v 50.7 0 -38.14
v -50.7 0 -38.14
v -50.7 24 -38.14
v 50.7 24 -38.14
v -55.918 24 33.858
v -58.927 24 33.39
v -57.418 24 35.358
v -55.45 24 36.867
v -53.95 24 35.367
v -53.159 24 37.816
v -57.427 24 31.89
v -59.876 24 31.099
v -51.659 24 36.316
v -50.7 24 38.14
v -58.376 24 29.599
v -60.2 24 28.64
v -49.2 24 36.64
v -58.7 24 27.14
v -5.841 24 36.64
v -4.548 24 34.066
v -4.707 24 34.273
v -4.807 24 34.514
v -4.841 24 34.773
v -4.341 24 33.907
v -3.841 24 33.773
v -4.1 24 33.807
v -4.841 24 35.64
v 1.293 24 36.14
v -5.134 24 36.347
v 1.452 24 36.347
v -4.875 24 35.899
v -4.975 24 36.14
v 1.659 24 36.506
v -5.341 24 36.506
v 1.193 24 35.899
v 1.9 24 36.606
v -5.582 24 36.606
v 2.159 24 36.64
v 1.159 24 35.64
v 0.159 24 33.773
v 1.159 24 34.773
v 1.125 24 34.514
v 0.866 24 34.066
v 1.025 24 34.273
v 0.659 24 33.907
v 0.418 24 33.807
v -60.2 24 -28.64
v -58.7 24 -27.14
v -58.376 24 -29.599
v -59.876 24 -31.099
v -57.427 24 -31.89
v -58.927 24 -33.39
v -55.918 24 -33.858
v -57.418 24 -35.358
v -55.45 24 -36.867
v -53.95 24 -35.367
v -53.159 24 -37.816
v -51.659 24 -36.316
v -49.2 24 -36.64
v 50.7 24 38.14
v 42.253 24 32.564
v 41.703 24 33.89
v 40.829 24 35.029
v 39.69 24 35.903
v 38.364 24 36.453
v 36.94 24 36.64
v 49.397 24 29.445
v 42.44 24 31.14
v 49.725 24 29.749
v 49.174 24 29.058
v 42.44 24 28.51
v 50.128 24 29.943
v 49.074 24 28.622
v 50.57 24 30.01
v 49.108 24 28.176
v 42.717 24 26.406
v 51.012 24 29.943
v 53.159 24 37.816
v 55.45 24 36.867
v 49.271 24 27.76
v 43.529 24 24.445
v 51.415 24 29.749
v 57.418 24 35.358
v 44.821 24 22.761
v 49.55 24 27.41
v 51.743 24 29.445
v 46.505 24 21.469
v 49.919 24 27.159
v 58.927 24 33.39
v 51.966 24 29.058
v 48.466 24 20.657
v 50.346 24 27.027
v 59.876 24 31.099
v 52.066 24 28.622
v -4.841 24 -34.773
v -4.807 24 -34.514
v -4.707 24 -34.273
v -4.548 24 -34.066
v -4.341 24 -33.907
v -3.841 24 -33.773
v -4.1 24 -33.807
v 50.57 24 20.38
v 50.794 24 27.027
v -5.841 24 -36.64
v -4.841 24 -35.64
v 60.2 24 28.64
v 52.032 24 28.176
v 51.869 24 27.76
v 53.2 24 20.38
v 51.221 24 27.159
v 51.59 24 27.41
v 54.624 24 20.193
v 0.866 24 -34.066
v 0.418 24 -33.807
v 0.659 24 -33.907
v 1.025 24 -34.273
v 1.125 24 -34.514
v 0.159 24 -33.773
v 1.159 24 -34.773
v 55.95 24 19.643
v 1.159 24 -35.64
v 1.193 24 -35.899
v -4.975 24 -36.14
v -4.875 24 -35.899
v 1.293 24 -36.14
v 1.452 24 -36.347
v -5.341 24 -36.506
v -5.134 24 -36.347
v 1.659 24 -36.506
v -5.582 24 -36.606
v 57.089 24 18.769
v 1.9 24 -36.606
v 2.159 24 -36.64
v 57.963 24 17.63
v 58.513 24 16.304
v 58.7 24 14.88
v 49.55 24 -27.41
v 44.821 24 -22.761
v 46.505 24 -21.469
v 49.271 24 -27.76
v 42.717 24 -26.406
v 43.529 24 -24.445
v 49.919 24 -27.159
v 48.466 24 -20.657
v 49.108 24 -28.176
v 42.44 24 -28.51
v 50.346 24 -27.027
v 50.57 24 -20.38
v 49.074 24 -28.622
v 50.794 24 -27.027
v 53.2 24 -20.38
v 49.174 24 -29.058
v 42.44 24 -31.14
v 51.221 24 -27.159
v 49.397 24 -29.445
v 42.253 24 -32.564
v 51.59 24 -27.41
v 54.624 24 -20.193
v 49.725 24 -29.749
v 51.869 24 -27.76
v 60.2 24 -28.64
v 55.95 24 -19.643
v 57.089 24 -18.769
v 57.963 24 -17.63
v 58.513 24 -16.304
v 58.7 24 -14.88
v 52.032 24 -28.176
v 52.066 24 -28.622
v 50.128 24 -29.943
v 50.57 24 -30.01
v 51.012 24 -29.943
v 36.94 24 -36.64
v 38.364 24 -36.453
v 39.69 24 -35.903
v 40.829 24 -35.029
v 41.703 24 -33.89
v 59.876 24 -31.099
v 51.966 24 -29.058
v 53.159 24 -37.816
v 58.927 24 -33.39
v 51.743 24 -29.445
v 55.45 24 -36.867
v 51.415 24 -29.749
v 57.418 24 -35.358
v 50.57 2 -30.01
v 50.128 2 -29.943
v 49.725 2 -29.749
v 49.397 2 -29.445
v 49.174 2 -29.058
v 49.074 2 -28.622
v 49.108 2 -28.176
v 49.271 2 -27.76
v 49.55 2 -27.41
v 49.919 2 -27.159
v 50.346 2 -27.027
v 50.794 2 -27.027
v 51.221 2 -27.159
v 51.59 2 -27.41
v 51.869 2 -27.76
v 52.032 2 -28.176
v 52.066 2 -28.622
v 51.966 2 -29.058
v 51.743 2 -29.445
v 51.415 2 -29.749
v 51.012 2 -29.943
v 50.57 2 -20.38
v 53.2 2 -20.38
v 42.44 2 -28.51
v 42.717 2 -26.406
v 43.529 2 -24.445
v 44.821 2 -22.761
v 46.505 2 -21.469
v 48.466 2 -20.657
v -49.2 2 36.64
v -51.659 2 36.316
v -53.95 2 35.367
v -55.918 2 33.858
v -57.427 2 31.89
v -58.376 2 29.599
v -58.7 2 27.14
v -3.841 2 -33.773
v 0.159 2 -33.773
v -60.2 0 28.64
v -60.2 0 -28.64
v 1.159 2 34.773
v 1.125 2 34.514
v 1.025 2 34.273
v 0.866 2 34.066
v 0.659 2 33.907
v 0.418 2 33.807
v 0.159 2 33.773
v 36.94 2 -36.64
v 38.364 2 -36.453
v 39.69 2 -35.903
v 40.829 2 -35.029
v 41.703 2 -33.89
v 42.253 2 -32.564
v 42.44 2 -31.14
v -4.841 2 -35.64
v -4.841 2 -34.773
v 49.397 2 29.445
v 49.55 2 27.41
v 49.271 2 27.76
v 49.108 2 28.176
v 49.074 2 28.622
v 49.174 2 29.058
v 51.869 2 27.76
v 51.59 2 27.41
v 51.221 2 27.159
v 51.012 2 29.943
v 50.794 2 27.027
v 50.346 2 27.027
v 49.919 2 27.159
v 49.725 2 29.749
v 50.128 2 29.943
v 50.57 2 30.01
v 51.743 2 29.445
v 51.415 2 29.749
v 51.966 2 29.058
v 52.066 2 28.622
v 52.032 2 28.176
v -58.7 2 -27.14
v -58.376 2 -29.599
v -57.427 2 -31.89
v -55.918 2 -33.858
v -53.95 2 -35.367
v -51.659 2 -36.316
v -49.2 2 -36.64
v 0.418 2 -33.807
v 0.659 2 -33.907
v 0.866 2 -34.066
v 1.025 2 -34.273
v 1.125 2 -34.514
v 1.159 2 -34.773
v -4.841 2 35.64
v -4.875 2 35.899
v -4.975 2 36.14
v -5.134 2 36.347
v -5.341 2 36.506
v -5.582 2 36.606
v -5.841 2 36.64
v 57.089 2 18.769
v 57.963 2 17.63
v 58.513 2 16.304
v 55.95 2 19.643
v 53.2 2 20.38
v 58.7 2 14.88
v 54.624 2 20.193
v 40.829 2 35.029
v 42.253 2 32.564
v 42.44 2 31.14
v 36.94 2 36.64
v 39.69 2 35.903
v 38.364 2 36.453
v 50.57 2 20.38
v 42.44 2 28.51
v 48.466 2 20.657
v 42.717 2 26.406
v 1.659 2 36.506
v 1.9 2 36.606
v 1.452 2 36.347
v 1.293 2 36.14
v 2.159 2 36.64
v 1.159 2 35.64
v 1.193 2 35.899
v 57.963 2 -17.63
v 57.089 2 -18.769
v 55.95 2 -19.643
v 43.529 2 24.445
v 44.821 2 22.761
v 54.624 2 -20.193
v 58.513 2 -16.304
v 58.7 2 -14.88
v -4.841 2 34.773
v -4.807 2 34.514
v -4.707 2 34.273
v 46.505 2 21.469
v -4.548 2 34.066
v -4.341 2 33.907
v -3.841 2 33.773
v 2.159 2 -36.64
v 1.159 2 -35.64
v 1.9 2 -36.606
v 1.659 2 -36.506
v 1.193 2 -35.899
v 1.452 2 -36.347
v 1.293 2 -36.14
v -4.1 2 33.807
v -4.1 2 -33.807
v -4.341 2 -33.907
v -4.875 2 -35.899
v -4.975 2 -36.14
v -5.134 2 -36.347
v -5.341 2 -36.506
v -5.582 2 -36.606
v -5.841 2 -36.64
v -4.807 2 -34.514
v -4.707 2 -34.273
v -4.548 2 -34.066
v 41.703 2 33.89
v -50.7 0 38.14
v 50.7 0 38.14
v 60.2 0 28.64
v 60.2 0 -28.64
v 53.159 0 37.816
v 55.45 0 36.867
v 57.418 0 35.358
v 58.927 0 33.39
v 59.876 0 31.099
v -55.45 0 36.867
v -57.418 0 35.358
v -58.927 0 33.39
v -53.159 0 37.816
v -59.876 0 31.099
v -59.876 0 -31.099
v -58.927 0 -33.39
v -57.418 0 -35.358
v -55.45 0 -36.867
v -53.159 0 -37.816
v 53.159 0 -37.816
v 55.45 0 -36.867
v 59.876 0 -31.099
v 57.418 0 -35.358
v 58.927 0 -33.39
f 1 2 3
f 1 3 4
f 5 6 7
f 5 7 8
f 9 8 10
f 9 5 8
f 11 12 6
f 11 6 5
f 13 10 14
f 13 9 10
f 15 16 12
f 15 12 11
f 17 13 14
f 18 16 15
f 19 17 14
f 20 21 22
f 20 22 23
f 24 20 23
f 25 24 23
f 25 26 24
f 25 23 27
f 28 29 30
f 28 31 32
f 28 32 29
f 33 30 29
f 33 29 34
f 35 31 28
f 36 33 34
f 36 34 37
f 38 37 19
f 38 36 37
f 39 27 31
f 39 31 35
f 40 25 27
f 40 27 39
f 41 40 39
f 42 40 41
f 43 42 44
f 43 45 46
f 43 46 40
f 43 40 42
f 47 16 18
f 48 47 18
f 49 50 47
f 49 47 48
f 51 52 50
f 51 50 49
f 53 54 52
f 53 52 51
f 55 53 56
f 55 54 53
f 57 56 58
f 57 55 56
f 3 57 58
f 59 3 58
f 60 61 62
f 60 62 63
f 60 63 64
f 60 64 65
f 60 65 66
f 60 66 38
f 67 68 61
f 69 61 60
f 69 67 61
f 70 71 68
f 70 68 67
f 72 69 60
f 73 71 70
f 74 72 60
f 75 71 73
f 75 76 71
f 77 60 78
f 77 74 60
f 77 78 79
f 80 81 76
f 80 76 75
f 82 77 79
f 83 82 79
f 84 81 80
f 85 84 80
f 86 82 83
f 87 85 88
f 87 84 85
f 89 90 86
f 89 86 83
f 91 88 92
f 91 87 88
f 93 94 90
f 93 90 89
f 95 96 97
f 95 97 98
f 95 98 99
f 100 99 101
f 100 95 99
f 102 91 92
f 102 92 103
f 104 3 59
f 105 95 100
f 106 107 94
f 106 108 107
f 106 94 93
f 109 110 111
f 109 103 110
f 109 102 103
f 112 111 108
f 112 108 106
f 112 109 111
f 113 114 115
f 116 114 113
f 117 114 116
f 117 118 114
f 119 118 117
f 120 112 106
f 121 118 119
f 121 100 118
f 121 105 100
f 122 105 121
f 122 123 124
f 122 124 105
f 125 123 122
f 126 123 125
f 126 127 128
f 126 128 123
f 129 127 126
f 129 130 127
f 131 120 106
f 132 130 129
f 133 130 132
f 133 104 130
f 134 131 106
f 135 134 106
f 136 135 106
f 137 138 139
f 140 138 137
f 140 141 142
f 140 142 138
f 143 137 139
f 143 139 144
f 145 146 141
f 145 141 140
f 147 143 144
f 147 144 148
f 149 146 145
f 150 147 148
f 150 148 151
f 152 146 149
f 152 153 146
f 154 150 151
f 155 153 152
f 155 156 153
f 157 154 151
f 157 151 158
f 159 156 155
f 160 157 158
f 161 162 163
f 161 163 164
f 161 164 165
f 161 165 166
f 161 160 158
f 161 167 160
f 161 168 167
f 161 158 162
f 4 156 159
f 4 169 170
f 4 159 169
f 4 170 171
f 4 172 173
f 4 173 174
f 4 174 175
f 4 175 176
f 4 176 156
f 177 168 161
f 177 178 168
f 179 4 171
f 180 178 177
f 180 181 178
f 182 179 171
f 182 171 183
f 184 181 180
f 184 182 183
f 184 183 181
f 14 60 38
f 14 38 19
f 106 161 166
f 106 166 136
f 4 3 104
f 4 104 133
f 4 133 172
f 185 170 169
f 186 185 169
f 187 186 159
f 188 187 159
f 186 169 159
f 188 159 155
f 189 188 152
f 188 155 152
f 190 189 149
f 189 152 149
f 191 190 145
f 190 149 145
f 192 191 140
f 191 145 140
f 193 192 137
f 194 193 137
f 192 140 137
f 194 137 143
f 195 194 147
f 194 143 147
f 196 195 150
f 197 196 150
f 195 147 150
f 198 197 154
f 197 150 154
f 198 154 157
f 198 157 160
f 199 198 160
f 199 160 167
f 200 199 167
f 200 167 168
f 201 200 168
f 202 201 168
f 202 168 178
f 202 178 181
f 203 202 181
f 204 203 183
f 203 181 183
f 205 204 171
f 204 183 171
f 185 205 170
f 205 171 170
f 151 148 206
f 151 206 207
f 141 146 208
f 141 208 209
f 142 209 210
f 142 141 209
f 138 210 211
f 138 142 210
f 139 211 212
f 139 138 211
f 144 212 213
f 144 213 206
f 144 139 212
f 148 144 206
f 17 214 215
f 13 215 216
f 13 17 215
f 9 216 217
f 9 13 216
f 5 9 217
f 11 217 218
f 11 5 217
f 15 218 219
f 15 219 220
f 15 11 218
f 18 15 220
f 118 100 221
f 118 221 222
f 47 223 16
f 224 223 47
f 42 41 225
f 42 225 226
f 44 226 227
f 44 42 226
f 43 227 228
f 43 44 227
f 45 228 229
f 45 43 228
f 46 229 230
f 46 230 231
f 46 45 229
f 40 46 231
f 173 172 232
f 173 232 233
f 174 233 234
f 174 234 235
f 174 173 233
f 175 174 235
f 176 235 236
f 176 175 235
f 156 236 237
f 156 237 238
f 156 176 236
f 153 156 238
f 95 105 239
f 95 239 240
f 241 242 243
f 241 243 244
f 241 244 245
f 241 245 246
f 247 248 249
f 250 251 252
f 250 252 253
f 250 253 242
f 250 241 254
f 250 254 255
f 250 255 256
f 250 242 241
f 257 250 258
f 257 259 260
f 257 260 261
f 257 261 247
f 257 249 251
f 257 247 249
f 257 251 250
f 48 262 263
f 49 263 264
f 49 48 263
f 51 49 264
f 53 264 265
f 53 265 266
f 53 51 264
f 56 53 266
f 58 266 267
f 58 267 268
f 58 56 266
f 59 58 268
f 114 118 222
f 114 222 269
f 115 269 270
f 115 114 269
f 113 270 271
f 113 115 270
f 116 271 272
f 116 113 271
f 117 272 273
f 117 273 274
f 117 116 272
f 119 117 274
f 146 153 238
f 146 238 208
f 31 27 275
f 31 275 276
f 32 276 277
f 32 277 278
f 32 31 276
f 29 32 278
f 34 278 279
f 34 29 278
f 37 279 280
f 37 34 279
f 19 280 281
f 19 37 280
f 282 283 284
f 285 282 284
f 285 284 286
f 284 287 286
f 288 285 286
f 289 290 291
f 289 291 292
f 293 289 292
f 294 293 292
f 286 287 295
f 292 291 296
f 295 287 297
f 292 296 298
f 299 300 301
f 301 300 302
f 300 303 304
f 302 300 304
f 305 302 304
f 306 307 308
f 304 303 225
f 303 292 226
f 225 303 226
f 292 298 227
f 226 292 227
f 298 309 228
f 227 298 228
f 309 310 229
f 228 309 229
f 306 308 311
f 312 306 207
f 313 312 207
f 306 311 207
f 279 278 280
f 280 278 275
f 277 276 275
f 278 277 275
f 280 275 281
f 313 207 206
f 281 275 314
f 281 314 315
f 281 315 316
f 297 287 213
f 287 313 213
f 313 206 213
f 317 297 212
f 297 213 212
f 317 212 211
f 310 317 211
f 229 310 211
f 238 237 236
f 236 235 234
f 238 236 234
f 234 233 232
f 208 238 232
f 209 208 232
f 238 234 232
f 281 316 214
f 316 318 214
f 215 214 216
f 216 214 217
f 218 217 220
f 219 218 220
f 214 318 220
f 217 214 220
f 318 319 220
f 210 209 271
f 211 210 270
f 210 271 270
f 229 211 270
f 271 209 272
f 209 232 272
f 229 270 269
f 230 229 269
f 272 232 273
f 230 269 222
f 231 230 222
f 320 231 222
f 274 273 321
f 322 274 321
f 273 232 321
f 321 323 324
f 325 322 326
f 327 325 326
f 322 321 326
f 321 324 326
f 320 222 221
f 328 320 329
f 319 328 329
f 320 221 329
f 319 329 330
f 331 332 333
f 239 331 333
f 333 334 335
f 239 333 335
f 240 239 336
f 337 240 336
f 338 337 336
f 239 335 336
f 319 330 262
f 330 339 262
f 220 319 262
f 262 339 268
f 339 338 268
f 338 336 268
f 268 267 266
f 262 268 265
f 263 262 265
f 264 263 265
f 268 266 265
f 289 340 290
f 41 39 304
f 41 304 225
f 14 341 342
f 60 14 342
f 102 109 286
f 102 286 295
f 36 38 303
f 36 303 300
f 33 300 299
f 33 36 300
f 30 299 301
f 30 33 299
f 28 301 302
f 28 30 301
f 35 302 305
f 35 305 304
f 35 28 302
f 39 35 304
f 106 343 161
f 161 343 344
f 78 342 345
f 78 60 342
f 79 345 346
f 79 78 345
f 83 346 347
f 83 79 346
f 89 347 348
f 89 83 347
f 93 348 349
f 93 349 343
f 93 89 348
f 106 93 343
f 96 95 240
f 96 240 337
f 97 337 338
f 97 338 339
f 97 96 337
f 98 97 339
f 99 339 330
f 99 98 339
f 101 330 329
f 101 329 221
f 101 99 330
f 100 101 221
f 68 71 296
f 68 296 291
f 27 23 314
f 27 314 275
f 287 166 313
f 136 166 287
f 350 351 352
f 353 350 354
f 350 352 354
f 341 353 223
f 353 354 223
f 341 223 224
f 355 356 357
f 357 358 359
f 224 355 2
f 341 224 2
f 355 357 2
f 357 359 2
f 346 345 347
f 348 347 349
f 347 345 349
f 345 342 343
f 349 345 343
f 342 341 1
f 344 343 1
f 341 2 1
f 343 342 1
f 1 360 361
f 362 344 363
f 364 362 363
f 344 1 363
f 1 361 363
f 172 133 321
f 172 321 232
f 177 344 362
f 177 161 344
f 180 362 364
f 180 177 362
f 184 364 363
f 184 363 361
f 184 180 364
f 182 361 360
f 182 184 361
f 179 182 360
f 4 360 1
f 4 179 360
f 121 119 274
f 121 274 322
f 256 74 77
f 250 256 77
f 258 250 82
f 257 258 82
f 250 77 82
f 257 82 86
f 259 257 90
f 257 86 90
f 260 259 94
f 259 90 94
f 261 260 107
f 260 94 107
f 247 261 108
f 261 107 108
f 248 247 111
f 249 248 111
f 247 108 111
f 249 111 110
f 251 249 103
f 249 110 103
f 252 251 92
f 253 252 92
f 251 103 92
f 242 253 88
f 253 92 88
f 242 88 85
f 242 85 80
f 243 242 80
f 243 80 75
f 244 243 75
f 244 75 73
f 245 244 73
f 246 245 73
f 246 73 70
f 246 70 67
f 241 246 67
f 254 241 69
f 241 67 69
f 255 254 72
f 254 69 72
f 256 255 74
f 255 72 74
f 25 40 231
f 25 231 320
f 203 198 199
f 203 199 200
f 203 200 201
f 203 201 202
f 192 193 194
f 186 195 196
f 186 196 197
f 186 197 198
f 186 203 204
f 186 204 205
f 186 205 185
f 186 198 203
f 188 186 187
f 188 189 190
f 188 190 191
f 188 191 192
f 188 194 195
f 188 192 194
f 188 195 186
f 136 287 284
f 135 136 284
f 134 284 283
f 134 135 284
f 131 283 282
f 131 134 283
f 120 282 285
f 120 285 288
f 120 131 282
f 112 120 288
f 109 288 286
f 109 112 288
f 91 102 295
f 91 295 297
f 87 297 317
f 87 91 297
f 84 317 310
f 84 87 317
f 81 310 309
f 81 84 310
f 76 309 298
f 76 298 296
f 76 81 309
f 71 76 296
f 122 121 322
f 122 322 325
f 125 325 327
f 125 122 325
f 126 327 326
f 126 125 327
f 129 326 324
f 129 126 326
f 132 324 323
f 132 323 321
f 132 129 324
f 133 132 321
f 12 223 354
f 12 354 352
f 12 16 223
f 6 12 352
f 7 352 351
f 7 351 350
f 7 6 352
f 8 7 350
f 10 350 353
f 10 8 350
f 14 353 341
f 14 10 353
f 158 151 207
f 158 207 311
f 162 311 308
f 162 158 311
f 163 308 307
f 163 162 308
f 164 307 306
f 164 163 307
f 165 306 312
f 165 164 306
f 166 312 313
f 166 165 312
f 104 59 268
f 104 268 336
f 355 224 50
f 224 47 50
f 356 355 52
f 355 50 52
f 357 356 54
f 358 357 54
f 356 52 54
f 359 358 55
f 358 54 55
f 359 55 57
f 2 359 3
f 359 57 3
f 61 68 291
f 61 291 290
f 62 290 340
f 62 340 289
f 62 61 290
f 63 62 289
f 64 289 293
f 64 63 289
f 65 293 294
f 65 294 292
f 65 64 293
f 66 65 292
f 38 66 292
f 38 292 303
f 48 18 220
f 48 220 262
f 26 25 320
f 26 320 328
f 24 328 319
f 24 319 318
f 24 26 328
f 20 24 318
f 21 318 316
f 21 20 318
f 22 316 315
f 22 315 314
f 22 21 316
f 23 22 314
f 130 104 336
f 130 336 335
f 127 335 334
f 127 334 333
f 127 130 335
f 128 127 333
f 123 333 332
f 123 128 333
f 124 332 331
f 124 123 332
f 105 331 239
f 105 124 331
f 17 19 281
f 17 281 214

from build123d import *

# Parameters (mm, degrees)
SKETCH1_W           = 120.4
SKETCH1_H           = 76.28
BOSS_EXTRUDE1_DEPTH = 24
FILLET1_R           = 9.5
SKETCH2_R           = 1.5
CUT_EXTRUDE1_DEPTH  = 22


with BuildPart() as part:
    # Sketch1 → Boss-Extrude1 (new body)
    with BuildSketch(Plane(origin=(0, 0, 0), x_dir=(1, 0, 0), z_dir=(0, 1, 0))):
        Rectangle(SKETCH1_W, SKETCH1_H)
    extrude(amount=BOSS_EXTRUDE1_DEPTH)

    # Fillet1
    fillet1_edges = [part.edges().sort_by_distance(p)[0] for p in [
        (60.2, 12, 38.14),
        (-60.2, 12, 38.14),
        (-60.2, 12, -38.14),
        (60.2, 12, -38.14),
    ]]
    fillet(fillet1_edges, radius=FILLET1_R)

    # Sketch2 → Cut-Extrude1 (cut)
    with BuildSketch(Plane(origin=(0, 24, 0), x_dir=(1, 0, 0), z_dir=(0, 1, 0))):
        with Locations(Location((50.57, -28.51, 0), (0, 0, 270))):
            Circle(SKETCH2_R)
        with Locations(Location((50.57, 28.51, 0), (0, 0, 90))):
            Circle(SKETCH2_R)
        with BuildLine():
            Line((-49.2, 36.64), (-5.840999167, 36.64))
            ThreePointArc((-5.840999167, 36.64), (-5.133892386, 36.347106781), (-4.840999167, 35.64))
            Line((-4.840999167, 35.64), (-4.840999167, 34.772736938))
            ThreePointArc((-4.840999167, 34.772736938), (-4.548105948, 34.065630157), (-3.840999167, 33.772736938))
            Line((-3.840999167, 33.772736938), (0.159000833, 33.772736938))
            ThreePointArc((0.159000833, 33.772736938), (0.866107614, 34.065630157), (1.159000833, 34.772736938))
            Line((1.159000833, 34.772736938), (1.159000833, 35.64))
            ThreePointArc((1.159000833, 35.64), (1.451894052, 36.347106781), (2.159000833, 36.64))
            Line((2.159000833, 36.64), (36.94, 36.64))
            ThreePointArc((36.94, 36.64), (40.829087297, 35.029087297), (42.44, 31.14))
            Line((42.44, 31.14), (42.44, 28.51))
            ThreePointArc((42.44, 28.51), (44.821221869, 22.761221869), (50.57, 20.38))
            Line((50.57, 20.38), (53.2, 20.38))
            ThreePointArc((53.2, 20.38), (57.089087297, 18.769087297), (58.7, 14.88))
            Line((58.7, 14.88), (58.7, -14.88))
            ThreePointArc((58.7, -14.88), (57.089087297, -18.769087297), (53.2, -20.38))
            Line((53.2, -20.38), (50.57, -20.38))
            ThreePointArc((50.57, -20.38), (44.821221869, -22.761221869), (42.44, -28.51))
            Line((42.44, -28.51), (42.44, -31.14))
            ThreePointArc((42.44, -31.14), (40.829087297, -35.029087297), (36.94, -36.64))
            Line((36.94, -36.64), (2.159000833, -36.64))
            ThreePointArc((2.159000833, -36.64), (1.451894052, -36.347106781), (1.159000833, -35.64))
            Line((1.159000833, -35.64), (1.159000833, -34.772736938))
            ThreePointArc((1.159000833, -34.772736938), (0.866107614, -34.065630157), (0.159000833, -33.772736938))
            Line((0.159000833, -33.772736938), (-3.840999167, -33.772736938))
            ThreePointArc((-3.840999167, -33.772736938), (-4.548105948, -34.065630157), (-4.840999167, -34.772736938))
            Line((-4.840999167, -34.772736938), (-4.840999167, -35.64))
            ThreePointArc((-4.840999167, -35.64), (-5.133892386, -36.347106781), (-5.840999167, -36.64))
            Line((-5.840999167, -36.64), (-49.2, -36.64))
            ThreePointArc((-49.2, -36.64), (-55.917514421, -33.857514421), (-58.7, -27.14))
            Line((-58.7, -27.14), (-58.7, 27.14))
            ThreePointArc((-58.7, 27.14), (-55.917514421, 33.857514421), (-49.2, 36.64))
        make_face()
    extrude(amount=-CUT_EXTRUDE1_DEPTH, mode=Mode.SUBTRACT)


solid = part.part
